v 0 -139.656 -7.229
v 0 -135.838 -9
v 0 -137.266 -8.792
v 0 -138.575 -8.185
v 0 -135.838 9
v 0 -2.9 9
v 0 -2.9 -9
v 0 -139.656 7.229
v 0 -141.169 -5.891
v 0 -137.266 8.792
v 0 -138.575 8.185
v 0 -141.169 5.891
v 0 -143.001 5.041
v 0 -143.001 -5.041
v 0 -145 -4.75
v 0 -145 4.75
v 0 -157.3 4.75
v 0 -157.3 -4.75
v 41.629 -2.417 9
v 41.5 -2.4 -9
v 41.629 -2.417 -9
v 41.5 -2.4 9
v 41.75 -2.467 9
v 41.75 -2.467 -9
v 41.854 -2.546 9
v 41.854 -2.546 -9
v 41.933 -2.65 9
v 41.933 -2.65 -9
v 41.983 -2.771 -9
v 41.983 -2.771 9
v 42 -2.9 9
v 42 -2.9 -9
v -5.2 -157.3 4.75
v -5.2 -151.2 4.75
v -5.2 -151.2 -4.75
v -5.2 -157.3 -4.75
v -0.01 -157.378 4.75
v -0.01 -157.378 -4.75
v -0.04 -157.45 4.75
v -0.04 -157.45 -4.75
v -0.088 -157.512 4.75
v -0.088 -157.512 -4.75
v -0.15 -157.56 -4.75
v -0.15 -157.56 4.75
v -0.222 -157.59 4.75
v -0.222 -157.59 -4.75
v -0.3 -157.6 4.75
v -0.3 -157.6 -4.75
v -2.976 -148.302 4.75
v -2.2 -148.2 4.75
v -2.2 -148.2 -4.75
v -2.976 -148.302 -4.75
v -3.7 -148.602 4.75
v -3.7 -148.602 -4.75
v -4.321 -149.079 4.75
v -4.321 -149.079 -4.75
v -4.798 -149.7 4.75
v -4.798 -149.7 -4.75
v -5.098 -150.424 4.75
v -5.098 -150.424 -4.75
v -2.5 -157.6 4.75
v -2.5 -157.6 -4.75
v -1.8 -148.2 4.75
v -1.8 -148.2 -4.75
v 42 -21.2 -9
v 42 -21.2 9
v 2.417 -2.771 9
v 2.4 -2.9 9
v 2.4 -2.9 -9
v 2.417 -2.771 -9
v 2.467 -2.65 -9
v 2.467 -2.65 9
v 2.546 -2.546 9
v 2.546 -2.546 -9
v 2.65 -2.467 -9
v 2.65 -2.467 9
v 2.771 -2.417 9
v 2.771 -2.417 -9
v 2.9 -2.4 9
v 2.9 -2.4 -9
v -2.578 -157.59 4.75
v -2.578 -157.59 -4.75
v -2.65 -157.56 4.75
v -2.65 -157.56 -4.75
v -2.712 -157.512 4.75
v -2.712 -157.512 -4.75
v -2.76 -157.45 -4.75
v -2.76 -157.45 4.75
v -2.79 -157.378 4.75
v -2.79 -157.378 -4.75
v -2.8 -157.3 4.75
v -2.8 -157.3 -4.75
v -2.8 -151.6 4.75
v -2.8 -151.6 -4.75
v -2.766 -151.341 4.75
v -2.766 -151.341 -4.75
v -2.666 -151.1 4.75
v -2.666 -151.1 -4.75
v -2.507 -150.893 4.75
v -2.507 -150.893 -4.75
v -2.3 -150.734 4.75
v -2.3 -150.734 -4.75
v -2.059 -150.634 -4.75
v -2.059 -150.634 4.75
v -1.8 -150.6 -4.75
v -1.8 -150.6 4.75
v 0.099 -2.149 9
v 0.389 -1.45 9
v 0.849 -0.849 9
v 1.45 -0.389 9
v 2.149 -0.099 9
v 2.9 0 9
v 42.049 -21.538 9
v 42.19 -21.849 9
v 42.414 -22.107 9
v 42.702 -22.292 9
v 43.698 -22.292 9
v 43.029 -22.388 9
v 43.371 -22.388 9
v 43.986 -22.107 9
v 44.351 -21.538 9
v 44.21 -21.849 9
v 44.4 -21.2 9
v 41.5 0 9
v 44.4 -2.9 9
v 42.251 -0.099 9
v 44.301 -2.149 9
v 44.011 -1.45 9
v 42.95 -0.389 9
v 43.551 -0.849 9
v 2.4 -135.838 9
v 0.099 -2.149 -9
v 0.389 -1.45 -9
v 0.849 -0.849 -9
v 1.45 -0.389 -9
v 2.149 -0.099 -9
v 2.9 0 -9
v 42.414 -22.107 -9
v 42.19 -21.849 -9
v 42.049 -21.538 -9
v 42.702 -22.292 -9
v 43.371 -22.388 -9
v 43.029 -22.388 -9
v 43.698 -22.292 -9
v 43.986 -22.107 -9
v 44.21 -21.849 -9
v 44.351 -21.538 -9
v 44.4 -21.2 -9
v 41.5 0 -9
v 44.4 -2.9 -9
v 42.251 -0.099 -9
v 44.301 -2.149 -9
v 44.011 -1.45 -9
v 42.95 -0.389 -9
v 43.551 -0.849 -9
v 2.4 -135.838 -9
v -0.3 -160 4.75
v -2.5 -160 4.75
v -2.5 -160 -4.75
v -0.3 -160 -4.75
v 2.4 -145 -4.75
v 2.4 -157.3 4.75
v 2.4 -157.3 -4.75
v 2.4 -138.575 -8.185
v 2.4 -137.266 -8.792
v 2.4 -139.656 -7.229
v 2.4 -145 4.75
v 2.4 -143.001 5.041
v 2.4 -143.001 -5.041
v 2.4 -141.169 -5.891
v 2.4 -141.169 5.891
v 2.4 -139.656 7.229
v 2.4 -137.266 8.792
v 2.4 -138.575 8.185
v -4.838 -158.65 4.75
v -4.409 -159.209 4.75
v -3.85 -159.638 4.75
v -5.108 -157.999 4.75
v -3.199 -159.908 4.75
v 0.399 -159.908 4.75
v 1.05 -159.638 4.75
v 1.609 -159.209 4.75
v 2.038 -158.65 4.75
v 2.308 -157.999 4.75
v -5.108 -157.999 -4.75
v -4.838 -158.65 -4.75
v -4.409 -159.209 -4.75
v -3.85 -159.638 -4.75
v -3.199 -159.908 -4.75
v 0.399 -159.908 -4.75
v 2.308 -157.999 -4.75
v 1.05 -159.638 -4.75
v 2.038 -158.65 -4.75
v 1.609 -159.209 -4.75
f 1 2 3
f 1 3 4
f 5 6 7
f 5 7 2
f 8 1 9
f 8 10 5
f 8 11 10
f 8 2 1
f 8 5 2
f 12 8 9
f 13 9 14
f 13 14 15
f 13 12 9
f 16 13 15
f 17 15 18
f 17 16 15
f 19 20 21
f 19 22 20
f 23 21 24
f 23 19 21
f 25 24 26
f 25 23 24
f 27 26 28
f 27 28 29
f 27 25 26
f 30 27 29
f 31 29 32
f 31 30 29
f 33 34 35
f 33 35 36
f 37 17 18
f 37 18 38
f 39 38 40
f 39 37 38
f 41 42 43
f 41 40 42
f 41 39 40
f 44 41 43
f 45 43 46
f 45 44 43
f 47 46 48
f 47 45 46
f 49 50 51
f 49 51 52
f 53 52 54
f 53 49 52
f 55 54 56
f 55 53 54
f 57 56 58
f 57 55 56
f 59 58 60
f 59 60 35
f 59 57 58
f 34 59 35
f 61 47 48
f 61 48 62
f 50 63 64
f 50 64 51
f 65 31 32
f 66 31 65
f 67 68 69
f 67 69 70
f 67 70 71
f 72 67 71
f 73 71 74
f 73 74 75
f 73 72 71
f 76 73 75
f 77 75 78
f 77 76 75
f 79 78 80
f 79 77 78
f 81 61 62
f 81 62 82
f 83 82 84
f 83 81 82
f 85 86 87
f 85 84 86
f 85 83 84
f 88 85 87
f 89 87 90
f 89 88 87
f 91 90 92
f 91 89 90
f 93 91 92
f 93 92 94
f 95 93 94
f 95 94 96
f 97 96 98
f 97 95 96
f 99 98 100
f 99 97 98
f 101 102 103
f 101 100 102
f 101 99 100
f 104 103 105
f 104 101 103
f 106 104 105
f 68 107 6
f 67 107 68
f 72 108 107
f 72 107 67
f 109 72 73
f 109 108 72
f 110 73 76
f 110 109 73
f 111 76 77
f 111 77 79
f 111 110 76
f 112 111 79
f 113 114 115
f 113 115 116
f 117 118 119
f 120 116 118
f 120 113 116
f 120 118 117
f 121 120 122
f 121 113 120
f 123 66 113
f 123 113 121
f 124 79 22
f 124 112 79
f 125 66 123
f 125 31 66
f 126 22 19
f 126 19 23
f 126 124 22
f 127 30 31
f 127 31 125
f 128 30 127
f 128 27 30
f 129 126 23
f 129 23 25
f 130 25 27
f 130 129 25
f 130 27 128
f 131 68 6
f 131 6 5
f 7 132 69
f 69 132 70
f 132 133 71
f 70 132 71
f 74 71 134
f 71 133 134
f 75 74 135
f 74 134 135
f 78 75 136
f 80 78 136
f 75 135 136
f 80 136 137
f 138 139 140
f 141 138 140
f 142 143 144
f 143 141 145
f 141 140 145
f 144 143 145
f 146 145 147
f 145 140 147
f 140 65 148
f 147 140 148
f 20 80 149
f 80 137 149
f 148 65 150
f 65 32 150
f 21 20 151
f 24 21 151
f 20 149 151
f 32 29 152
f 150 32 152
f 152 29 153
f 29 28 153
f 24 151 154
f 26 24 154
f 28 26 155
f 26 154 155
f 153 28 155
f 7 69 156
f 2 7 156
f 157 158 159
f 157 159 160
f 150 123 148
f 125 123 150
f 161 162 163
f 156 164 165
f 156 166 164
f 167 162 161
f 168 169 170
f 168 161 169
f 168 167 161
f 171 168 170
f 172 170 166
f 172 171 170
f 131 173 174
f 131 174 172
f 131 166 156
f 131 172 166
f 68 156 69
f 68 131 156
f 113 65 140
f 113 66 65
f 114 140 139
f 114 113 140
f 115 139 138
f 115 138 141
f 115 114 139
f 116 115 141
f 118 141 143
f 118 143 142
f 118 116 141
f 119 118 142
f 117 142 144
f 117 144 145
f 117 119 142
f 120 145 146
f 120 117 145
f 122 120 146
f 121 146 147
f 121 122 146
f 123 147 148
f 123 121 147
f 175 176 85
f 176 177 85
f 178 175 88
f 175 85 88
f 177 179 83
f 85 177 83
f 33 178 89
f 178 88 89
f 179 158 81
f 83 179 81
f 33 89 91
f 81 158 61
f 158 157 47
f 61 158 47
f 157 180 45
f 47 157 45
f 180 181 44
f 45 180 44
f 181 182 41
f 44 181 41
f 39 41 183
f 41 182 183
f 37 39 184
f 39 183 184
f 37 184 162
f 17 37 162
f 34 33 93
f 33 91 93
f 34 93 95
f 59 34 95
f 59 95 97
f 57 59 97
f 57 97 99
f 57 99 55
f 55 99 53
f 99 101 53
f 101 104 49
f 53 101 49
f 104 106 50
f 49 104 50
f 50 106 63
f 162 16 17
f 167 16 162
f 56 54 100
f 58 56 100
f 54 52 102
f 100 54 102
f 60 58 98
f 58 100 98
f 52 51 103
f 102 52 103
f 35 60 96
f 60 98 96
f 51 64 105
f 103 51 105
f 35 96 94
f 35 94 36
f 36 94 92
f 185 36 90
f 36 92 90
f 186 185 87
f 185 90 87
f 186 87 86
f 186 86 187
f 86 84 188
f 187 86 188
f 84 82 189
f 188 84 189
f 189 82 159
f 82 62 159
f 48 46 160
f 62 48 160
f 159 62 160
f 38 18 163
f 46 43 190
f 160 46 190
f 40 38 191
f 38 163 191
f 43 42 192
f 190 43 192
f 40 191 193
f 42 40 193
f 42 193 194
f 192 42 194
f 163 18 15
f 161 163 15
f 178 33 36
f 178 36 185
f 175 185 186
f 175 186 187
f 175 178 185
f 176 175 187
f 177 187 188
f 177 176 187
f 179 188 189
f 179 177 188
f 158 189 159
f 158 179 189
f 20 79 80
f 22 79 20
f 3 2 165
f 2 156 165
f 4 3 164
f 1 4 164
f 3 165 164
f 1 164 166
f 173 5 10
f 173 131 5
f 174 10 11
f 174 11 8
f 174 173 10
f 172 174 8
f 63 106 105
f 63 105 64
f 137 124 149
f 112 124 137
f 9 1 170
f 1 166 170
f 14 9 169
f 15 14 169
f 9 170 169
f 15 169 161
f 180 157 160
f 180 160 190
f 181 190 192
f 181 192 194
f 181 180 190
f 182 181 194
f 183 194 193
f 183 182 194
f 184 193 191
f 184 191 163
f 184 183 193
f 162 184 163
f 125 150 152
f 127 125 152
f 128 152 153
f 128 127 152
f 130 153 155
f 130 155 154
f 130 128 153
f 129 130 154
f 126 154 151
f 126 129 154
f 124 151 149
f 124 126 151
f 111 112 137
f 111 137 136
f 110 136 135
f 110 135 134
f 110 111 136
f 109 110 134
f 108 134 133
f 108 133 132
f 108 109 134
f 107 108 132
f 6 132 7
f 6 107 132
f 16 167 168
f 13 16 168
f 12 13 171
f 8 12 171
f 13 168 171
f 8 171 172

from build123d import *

# Parameters (mm, degrees)
F1_DEPTH = 9
F3_DEPTH = 10
F4_R     = 5


with BuildPart() as f1:
    # F0 (on Top) → F1 (new body, symmetric)
    with BuildSketch(Plane.XY):
        with BuildLine():
            ThreePointArc((42, -21.2), (43.2, -22.4), (44.4, -21.2))
            Line((44.4, -21.2), (44.4, -2.9))
            ThreePointArc((44.4, -2.9), (43.5506096654, -0.8493903346), (41.5, 0))
            Line((41.5, 0), (2.9, 0))
            ThreePointArc((2.9, 0), (0.8493903346, -0.8493903346), (0, -2.9))
            Line((0, -2.9), (0, -157.3))
            ThreePointArc((0, -157.3), (-0.0878679656, -157.5121320344), (-0.3, -157.6))
            Line((-0.3, -157.6), (-2.5, -157.6))
            ThreePointArc((-2.5, -157.6), (-2.7121320344, -157.5121320344), (-2.8, -157.3))
            Line((-2.8, -157.3), (-2.8, -151.6))
            ThreePointArc((-2.8, -151.6), (-2.5071067812, -150.8928932188), (-1.8, -150.6))
            Line((-1.8, -150.6), (-1.8, -148.2))
            Line((-1.8, -148.2), (-2.2, -148.2))
            ThreePointArc((-2.2, -148.2), (-4.3213203436, -149.0786796564), (-5.2, -151.2))
            Line((-5.2, -151.2), (-5.2, -157.3))
            ThreePointArc((-5.2, -157.3), (-4.4091883092, -159.2091883092), (-2.5, -160))
            Line((-2.5, -160), (-0.3, -160))
            ThreePointArc((-0.3, -160), (1.6091883092, -159.2091883092), (2.4, -157.3))
            Line((2.4, -157.3), (2.4, -2.9))
            ThreePointArc((2.4, -2.9), (2.5464466094, -2.5464466094), (2.9, -2.4))
            Line((2.9, -2.4), (41.5, -2.4))
            ThreePointArc((41.5, -2.4), (41.8535533906, -2.5464466094), (42, -2.9))
            Line((42, -2.9), (42, -21.2))
        make_face()
    extrude(amount=F1_DEPTH, both=True)

    # F2 (on Right) → F3 (cut, symmetric)
    with BuildSketch(Plane.YZ):
        with BuildLine():
            Line((-163, 4.75), (-145, 4.75))
            ThreePointArc((-145, 4.75), (-140.0502525317, 6.8002525317), (-138, 11.75))
            Line((-138, 11.75), (-168, 11.75))
            Line((-168, 11.75), (-168, -11.75))
            Line((-168, -11.75), (-138, -11.75))
            ThreePointArc((-138, -11.75), (-140.0502525317, -6.8002525317), (-145, -4.75))
            Line((-145, -4.75), (-163, -4.75))
            Line((-163, -4.75), (-163, 4.75))
        make_face()
    extrude(amount=F3_DEPTH, both=True, mode=Mode.SUBTRACT)

    # F4
    f4_edges = [f1.edges().sort_by_distance(p)[0] for p in [
        (1.2, -138.562803, 9),
        (1.2, -138.562803, -9),
    ]]
    fillet(f4_edges, radius=F4_R)


solid = f1.part
